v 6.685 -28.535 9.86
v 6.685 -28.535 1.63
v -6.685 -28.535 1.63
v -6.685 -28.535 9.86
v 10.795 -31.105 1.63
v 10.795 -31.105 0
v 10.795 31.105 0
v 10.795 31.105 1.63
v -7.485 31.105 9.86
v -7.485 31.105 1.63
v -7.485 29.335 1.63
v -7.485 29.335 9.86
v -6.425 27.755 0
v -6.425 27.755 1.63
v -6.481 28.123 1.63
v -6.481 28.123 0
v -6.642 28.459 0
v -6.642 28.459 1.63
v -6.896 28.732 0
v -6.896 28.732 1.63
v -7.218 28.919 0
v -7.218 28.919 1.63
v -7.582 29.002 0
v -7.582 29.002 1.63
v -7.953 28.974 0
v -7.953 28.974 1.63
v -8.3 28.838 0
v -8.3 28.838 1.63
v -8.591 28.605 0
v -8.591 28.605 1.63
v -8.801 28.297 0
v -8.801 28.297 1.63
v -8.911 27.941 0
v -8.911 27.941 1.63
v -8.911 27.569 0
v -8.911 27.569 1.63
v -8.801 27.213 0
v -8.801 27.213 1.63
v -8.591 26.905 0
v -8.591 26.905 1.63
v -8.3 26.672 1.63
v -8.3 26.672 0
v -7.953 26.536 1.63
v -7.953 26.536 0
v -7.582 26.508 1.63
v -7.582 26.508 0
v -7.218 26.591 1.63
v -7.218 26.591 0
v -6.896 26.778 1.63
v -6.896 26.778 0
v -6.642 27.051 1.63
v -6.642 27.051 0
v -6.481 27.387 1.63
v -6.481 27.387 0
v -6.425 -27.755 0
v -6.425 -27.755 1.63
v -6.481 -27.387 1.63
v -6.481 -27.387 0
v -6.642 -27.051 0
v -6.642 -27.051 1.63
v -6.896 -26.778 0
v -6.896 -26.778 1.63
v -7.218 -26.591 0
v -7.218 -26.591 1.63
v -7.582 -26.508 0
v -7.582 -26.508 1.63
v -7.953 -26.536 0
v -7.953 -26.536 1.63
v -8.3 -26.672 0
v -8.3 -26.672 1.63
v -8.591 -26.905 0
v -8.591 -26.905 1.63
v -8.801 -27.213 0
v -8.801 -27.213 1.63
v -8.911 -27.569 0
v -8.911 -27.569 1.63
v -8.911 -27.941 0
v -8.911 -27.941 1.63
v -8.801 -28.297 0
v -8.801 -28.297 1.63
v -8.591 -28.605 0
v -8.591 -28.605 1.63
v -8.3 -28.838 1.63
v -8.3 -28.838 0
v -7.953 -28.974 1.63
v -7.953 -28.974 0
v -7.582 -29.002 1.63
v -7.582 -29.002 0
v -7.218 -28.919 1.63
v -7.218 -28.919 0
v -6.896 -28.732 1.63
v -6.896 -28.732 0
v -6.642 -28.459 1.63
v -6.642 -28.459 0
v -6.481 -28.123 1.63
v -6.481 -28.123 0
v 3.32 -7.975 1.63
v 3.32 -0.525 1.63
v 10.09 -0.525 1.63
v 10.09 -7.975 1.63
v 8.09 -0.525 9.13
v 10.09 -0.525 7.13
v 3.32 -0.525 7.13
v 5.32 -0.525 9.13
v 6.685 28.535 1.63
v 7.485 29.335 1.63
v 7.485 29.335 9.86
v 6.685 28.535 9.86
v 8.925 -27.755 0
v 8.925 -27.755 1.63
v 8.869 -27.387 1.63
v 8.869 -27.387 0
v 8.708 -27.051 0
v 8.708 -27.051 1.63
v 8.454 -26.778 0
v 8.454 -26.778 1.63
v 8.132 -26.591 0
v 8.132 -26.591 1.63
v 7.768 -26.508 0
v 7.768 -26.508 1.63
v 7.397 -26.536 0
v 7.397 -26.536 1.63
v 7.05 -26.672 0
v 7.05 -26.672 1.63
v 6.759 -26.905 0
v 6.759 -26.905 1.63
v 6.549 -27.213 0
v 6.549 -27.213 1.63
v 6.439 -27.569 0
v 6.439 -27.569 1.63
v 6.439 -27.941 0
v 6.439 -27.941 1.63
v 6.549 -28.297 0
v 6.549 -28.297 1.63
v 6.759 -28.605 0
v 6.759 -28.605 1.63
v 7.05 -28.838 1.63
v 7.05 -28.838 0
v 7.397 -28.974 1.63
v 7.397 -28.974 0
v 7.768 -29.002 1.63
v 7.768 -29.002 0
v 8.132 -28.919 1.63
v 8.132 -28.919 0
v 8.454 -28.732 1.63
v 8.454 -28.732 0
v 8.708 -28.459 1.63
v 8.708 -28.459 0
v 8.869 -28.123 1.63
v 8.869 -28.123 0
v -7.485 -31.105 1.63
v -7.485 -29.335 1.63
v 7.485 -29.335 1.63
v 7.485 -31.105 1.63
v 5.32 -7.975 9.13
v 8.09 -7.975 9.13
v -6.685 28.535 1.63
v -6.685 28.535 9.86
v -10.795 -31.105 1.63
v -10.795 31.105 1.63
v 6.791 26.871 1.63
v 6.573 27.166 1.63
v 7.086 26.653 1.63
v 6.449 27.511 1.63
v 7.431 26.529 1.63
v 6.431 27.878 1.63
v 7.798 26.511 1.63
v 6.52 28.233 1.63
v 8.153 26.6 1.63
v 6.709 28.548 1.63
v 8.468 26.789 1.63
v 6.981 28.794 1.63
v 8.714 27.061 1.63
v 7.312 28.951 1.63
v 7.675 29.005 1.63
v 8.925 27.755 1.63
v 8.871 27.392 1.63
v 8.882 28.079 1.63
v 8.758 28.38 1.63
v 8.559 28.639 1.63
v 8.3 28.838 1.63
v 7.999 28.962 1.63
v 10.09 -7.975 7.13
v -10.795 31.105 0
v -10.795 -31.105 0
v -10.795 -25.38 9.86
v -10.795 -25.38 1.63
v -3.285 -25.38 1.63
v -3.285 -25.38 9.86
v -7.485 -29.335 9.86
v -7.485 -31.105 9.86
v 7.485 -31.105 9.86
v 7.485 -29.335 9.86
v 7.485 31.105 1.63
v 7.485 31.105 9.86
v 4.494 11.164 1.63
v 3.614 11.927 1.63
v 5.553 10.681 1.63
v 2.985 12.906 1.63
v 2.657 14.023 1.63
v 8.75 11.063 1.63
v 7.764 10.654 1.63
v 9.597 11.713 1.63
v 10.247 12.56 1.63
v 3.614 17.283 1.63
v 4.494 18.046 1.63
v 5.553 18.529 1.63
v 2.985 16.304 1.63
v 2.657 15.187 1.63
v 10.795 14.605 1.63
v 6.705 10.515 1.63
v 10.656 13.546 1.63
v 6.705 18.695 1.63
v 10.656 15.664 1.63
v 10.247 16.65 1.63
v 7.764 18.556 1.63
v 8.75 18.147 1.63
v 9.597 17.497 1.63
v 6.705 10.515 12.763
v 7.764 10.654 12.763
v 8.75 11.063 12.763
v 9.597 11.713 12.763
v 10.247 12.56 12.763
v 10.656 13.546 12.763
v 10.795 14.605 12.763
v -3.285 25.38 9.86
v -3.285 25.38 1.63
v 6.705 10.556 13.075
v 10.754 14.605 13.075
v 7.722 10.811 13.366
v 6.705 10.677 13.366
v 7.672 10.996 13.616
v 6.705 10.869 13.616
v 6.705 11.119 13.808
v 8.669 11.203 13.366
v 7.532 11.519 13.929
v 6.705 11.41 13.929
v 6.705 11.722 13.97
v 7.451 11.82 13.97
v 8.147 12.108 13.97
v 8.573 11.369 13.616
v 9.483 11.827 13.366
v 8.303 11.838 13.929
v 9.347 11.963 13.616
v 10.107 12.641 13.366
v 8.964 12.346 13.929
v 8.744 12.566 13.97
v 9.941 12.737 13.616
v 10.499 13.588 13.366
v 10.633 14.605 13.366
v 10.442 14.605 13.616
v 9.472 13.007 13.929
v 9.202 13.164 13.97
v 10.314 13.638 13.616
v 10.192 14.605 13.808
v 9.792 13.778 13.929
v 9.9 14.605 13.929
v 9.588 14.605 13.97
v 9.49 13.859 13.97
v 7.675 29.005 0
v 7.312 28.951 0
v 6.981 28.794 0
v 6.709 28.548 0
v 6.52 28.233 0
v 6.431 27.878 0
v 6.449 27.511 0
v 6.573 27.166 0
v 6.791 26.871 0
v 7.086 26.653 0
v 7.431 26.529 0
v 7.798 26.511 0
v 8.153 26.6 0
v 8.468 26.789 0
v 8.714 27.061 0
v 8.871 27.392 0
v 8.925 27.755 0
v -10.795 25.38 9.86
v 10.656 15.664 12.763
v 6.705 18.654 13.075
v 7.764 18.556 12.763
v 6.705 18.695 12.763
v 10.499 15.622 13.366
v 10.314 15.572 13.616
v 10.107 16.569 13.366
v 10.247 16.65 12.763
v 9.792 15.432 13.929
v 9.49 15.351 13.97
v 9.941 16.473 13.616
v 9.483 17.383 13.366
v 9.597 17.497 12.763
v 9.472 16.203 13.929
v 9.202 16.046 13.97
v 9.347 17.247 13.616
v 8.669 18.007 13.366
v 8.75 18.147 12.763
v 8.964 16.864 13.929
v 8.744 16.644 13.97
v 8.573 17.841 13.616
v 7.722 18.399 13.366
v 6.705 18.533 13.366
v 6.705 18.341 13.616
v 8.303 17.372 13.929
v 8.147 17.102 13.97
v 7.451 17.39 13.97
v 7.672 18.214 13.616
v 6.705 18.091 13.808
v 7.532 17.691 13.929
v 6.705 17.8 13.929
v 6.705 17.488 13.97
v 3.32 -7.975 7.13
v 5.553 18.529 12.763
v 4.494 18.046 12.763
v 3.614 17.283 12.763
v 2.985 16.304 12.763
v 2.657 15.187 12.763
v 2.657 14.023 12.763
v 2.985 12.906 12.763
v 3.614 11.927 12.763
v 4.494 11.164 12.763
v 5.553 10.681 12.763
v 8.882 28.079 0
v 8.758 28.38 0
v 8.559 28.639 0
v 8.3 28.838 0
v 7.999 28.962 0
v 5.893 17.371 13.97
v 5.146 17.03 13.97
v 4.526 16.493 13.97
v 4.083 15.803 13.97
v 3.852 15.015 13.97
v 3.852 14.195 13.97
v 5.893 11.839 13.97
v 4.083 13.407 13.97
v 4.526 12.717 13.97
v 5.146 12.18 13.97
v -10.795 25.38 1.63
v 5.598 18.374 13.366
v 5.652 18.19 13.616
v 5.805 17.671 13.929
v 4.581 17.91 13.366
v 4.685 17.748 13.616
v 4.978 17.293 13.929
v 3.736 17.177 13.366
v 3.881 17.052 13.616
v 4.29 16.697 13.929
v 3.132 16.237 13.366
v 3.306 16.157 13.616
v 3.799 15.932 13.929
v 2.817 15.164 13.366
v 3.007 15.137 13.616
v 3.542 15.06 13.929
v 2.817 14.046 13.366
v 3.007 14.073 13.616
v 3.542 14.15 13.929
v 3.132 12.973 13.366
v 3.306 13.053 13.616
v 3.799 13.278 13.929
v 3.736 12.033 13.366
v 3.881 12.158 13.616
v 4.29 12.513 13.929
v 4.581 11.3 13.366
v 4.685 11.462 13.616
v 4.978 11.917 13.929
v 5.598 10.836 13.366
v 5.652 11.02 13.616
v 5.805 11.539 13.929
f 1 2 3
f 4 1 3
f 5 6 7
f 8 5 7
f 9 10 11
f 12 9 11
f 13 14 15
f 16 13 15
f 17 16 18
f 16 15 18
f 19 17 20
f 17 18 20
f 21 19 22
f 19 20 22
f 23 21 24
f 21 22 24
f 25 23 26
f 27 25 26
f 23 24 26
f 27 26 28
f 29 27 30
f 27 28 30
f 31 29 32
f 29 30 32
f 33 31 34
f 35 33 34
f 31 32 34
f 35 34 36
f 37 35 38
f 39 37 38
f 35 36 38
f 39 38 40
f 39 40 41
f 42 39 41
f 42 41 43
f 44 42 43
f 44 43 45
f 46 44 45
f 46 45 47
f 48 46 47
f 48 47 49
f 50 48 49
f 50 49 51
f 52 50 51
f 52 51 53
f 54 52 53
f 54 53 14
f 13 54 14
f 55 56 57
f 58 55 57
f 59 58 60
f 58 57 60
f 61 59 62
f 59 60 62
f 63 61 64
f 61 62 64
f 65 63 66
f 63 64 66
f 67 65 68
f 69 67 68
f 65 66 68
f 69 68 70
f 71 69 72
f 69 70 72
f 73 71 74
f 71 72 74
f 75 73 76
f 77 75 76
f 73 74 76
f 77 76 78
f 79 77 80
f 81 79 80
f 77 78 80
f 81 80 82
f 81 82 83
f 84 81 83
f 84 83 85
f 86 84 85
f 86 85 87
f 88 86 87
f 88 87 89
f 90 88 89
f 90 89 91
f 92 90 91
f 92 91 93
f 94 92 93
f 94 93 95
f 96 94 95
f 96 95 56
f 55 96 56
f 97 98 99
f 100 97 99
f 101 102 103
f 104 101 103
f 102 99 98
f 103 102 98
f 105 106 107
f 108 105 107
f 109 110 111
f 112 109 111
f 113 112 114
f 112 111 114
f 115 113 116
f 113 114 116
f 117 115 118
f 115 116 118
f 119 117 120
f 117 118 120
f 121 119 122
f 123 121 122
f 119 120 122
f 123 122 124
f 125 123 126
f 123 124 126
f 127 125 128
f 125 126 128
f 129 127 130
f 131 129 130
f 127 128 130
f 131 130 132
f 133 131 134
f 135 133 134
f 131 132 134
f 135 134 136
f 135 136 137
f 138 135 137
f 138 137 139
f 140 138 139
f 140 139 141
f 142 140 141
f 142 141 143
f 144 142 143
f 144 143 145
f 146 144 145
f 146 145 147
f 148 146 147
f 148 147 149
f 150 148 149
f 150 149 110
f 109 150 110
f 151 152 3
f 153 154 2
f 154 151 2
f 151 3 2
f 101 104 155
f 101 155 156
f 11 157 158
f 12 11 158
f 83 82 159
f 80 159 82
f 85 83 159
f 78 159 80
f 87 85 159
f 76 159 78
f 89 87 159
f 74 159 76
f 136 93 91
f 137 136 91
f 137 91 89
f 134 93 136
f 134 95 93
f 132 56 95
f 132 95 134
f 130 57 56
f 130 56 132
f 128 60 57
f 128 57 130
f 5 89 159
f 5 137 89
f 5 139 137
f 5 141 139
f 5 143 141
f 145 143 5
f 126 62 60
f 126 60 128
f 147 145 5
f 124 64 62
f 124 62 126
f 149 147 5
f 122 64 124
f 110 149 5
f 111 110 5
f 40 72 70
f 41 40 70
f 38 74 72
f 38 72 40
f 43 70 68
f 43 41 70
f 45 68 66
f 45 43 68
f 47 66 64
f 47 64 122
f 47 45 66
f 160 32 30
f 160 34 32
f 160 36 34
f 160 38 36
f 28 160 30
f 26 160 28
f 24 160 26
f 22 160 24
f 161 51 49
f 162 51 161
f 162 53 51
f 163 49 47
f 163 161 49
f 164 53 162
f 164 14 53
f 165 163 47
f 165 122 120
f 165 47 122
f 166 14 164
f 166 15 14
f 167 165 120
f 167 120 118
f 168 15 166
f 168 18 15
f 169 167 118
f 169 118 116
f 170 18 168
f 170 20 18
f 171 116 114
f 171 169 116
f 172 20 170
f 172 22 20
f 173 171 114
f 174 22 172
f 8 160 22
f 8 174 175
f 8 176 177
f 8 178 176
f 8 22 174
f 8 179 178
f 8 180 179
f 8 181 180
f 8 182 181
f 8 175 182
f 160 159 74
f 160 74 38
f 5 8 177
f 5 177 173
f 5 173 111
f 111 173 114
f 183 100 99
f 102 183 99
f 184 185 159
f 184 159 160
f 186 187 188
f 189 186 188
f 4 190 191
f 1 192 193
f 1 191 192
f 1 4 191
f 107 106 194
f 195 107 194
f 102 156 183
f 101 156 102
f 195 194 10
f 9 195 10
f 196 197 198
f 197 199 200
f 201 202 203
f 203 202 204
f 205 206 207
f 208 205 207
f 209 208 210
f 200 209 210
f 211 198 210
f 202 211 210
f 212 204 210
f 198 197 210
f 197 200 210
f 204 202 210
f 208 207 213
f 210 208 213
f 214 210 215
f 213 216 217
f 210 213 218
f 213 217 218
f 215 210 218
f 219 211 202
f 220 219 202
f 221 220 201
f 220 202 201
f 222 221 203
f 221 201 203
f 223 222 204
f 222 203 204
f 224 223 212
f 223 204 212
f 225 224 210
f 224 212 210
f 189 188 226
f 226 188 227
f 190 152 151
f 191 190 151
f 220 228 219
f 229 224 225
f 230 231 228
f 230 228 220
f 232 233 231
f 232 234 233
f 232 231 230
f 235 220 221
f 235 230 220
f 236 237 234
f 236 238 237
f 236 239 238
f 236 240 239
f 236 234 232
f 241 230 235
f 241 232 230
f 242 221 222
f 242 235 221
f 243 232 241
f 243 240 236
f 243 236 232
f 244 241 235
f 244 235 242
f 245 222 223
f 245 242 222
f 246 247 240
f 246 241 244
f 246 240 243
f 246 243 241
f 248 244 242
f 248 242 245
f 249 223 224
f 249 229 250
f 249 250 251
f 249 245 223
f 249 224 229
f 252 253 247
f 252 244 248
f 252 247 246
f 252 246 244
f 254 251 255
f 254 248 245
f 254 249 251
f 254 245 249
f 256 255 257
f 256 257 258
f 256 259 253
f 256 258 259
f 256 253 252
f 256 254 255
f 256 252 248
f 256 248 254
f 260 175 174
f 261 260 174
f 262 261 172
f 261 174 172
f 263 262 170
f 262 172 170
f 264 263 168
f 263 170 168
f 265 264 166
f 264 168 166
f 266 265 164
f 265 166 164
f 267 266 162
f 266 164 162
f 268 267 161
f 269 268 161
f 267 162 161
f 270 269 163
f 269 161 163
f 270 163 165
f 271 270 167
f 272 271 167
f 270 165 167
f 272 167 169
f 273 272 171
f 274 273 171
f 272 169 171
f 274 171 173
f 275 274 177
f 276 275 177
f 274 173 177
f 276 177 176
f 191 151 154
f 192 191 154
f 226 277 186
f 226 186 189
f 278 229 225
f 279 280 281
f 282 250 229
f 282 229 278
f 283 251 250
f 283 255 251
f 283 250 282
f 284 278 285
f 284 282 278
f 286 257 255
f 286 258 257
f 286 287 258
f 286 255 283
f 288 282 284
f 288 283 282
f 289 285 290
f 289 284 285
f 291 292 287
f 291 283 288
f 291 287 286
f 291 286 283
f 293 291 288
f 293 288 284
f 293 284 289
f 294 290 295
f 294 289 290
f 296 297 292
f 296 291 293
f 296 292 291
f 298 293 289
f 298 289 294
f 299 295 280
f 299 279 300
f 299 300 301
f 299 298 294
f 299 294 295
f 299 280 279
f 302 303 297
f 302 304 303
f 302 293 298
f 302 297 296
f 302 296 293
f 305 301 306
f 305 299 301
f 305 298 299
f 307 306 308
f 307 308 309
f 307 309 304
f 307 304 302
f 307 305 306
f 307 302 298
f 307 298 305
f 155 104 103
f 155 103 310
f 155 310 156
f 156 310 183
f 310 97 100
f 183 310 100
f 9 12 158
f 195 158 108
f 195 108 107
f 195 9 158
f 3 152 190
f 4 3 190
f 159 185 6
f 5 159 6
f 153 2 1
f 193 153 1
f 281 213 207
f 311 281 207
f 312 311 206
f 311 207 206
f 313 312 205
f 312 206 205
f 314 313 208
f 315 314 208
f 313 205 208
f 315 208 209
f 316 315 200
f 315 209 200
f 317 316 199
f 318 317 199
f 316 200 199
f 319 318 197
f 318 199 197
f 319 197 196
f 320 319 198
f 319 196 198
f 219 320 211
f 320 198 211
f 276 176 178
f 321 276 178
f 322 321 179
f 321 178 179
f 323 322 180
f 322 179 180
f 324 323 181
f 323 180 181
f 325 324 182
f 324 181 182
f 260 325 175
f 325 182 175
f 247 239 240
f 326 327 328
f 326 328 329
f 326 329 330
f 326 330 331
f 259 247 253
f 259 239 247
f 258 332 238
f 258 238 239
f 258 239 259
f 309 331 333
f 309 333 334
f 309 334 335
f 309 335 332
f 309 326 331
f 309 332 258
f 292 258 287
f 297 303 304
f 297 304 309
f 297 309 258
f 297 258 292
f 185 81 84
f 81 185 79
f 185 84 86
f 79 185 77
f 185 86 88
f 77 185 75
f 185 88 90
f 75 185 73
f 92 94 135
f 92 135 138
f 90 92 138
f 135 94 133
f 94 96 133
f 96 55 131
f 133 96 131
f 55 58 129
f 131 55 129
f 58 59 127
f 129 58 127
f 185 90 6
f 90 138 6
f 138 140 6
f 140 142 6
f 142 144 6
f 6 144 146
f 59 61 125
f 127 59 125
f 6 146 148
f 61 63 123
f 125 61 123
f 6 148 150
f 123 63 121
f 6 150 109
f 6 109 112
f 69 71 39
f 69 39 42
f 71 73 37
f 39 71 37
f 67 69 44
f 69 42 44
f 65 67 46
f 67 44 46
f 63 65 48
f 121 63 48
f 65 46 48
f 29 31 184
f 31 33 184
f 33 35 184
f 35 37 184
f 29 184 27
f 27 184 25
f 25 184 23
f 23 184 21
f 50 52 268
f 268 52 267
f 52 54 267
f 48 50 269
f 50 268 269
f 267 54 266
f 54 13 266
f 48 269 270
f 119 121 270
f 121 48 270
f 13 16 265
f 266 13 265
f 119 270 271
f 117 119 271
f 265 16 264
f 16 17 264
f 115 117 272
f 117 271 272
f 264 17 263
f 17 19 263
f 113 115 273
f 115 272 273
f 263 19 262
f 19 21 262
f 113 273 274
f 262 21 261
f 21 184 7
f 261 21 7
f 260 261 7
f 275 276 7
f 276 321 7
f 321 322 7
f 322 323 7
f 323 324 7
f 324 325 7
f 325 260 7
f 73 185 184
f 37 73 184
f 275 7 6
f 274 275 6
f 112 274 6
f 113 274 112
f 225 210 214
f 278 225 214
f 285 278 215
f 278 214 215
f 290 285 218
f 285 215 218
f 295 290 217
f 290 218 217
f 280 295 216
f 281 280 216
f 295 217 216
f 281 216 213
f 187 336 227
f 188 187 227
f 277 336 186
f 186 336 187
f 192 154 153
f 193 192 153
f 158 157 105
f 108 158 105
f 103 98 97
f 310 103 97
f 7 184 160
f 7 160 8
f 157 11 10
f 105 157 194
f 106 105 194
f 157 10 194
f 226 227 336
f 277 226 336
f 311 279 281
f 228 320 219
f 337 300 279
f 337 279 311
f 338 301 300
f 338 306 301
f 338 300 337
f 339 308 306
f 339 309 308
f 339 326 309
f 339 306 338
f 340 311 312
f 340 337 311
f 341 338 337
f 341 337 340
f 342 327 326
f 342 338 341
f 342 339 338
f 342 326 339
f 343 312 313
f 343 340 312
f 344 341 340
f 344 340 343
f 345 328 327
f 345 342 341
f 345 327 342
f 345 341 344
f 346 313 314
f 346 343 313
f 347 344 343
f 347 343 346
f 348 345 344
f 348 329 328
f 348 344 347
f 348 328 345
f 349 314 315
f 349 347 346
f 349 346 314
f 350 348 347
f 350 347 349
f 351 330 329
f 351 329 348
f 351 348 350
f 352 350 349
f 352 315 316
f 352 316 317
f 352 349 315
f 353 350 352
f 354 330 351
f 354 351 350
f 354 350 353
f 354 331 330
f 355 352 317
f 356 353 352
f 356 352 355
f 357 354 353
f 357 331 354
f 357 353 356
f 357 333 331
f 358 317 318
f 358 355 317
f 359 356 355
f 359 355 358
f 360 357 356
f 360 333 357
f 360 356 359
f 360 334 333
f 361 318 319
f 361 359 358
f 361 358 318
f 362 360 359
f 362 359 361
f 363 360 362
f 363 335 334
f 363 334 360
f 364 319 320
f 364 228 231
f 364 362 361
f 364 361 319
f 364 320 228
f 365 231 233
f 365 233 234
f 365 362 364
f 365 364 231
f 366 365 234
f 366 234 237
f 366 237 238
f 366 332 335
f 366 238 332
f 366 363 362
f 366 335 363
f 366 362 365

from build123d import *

# Parameters (mm, degrees)
F0_W       = 21.59
F0_H       = 62.21
F1_DEPTH   = 1.63
F4_DEPTH   = 12.34
F5_DEPTH   = 7.5
F2_R       = 1.25
F6_DEPTH   = 25
F7_SIZE    = 2
F8_R       = 1.2071067812
F10_DEPTH  = 8.23
F12_DEPTH  = 8.23
F13_SIZE   = 0.8
F13_2_SIZE = 0.8


with BuildPart() as f1:
    # F0 (on Top) → F1 (new body)
    with BuildSketch(Plane.XY):
        Rectangle(F0_W, F0_H)
    extrude(amount=F1_DEPTH)

    # F2 (on face) → F6 (cut)
    with BuildSketch(Plane.XY.offset(1.63)):
        with BuildLine():
            ThreePointArc((7.675, 29.005), (6.7911165235, 26.8711165235), (8.925, 27.755))
            Line((8.925, 27.755), (7.675, 27.755))
            Line((7.675, 27.755), (7.675, 29.005))
        make_face()
        with BuildLine():
            Line((7.675, 27.755), (8.925, 27.755))
            ThreePointArc((8.925, 27.755), (8.5588834765, 28.6388834765), (7.675, 29.005))
            Line((7.675, 29.005), (7.675, 27.755))
        make_face()
        with Locations((-7.675, 27.755)):
            Circle(F2_R)
        with Locations((-7.675, -27.755)):
            Circle(F2_R)
        with Locations((7.675, -27.755)):
            Circle(F2_R)
    extrude(amount=-F6_DEPTH, mode=Mode.SUBTRACT)


with BuildPart() as f4:
    # F3 (on face) → F4 (new body)
    with BuildSketch(Plane.XY.offset(1.63)):
        with BuildLine():
            ThreePointArc((10.7950629295, 14.605), (9.5971296646, 17.4970667351), (6.7050629295, 18.695))
            ThreePointArc((6.7050629295, 18.695), (2.6150629295, 14.605), (6.7050629295, 10.515))
            ThreePointArc((6.7050629295, 10.515), (9.5971296646, 11.7129332649), (10.7950629295, 14.605))
        make_face()
    extrude(amount=F4_DEPTH)

    # F8
    f8_edges = [f4.edges().sort_by_distance(p)[0] for p in [
        (6.705063, 18.695, 13.97),
    ]]
    fillet(f8_edges, radius=F8_R)


with BuildPart() as f5:
    # F3 (on face) → F5 (new body)
    with BuildSketch(Plane.XY.offset(1.63)):
        Polygon((10.0900629295, -0.525), (6.7050629295, -0.525), (3.3200629295, -0.525), (3.3200629295, -7.975), (10.0900629295, -7.975), align=None)
    extrude(amount=F5_DEPTH)

    # F7
    f7_edges = [f5.edges().sort_by_distance(p)[0] for p in [
        (3.320063, -4.25, 9.13),
        (10.090063, -4.25, 9.13),
    ]]
    chamfer(f7_edges, length=F7_SIZE)


with BuildPart() as f10:
    # F9 (on face) → F10 (new body)
    with BuildSketch(Plane.XY.offset(1.63)):
        Polygon((-10.795, 25.38), (-10.795, 0), (-10.795, -25.38), (-3.285, -25.38), (-3.285, 25.38), align=None)
    extrude(amount=F10_DEPTH)


with BuildPart() as f12:
    # F11 (on face) → F12 (new body)
    with BuildSketch(Plane.XY.offset(1.63)):
        with BuildLine():
            Line((7.485, 31.105), (0, 31.105))
            Line((0, 31.105), (-7.485, 31.105))
            Line((-7.485, 31.105), (-7.485, 28.9904756169))
            ThreePointArc((-7.485, 28.9904756169), (-7.0487343616, 28.8368000509), (-6.6982195743, 28.535))
            Line((-6.6982195743, 28.535), (6.6982195743, 28.535))
            ThreePointArc((6.6982195743, 28.535), (7.0487343616, 28.8368000509), (7.485, 28.9904756169))
            Line((7.485, 28.9904756169), (7.485, 31.105))
        make_face()
        with BuildLine():
            Line((7.485, 28.535), (7.485, 28.9904756169))
            ThreePointArc((7.485, 28.9904756169), (7.0487343616, 28.8368000509), (6.6982195743, 28.535))
            Line((6.6982195743, 28.535), (7.485, 28.535))
        make_face()
        with BuildLine():
            ThreePointArc((-6.6982195743, 28.535), (-7.0487343616, 28.8368000509), (-7.485, 28.9904756169))
            Line((-7.485, 28.9904756169), (-7.485, 28.535))
            Line((-7.485, 28.535), (-6.6982195743, 28.535))
        make_face()
    extrude(amount=F12_DEPTH)

    # F13
    f13_edges = [f12.edges().sort_by_distance(p)[0] for p in [
        (-7.485, 28.535, 5.745),
        (7.485, 28.535, 5.745),
    ]]
    chamfer(f13_edges, length=F13_SIZE)


with BuildPart() as f12b:
    # F11 (on face) → F12, piece 2 (new body)
    with BuildSketch(Plane.XY.offset(1.63)):
        with BuildLine():
            Line((-7.485, -28.9904756169), (-7.485, -31.105))
            Line((-7.485, -31.105), (0, -31.105))
            Line((0, -31.105), (7.485, -31.105))
            Line((7.485, -31.105), (7.485, -28.9904756169))
            ThreePointArc((7.485, -28.9904756169), (7.0487343616, -28.8368000509), (6.6982195743, -28.535))
            Line((6.6982195743, -28.535), (-6.6982195743, -28.535))
            ThreePointArc((-6.6982195743, -28.535), (-7.0487343616, -28.8368000509), (-7.485, -28.9904756169))
        make_face()
        with BuildLine():
            ThreePointArc((6.6982195743, -28.535), (7.0487343616, -28.8368000509), (7.485, -28.9904756169))
            Line((7.485, -28.9904756169), (7.485, -28.535))
            Line((7.485, -28.535), (6.6982195743, -28.535))
        make_face()
        with BuildLine():
            Line((-7.485, -28.535), (-7.485, -28.9904756169))
            ThreePointArc((-7.485, -28.9904756169), (-7.0487343616, -28.8368000509), (-6.6982195743, -28.535))
            Line((-6.6982195743, -28.535), (-7.485, -28.535))
        make_face()
    extrude(amount=F12_DEPTH)

    # F13#2
    f13_2_edges = [f12b.edges().sort_by_distance(p)[0] for p in [
        (-7.485, -28.535, 5.745),
        (7.485, -28.535, 5.745),
    ]]
    chamfer(f13_2_edges, length=F13_2_SIZE)


solid = Compound([f1.part, f4.part, f5.part, f10.part, f12.part, f12b.part])
